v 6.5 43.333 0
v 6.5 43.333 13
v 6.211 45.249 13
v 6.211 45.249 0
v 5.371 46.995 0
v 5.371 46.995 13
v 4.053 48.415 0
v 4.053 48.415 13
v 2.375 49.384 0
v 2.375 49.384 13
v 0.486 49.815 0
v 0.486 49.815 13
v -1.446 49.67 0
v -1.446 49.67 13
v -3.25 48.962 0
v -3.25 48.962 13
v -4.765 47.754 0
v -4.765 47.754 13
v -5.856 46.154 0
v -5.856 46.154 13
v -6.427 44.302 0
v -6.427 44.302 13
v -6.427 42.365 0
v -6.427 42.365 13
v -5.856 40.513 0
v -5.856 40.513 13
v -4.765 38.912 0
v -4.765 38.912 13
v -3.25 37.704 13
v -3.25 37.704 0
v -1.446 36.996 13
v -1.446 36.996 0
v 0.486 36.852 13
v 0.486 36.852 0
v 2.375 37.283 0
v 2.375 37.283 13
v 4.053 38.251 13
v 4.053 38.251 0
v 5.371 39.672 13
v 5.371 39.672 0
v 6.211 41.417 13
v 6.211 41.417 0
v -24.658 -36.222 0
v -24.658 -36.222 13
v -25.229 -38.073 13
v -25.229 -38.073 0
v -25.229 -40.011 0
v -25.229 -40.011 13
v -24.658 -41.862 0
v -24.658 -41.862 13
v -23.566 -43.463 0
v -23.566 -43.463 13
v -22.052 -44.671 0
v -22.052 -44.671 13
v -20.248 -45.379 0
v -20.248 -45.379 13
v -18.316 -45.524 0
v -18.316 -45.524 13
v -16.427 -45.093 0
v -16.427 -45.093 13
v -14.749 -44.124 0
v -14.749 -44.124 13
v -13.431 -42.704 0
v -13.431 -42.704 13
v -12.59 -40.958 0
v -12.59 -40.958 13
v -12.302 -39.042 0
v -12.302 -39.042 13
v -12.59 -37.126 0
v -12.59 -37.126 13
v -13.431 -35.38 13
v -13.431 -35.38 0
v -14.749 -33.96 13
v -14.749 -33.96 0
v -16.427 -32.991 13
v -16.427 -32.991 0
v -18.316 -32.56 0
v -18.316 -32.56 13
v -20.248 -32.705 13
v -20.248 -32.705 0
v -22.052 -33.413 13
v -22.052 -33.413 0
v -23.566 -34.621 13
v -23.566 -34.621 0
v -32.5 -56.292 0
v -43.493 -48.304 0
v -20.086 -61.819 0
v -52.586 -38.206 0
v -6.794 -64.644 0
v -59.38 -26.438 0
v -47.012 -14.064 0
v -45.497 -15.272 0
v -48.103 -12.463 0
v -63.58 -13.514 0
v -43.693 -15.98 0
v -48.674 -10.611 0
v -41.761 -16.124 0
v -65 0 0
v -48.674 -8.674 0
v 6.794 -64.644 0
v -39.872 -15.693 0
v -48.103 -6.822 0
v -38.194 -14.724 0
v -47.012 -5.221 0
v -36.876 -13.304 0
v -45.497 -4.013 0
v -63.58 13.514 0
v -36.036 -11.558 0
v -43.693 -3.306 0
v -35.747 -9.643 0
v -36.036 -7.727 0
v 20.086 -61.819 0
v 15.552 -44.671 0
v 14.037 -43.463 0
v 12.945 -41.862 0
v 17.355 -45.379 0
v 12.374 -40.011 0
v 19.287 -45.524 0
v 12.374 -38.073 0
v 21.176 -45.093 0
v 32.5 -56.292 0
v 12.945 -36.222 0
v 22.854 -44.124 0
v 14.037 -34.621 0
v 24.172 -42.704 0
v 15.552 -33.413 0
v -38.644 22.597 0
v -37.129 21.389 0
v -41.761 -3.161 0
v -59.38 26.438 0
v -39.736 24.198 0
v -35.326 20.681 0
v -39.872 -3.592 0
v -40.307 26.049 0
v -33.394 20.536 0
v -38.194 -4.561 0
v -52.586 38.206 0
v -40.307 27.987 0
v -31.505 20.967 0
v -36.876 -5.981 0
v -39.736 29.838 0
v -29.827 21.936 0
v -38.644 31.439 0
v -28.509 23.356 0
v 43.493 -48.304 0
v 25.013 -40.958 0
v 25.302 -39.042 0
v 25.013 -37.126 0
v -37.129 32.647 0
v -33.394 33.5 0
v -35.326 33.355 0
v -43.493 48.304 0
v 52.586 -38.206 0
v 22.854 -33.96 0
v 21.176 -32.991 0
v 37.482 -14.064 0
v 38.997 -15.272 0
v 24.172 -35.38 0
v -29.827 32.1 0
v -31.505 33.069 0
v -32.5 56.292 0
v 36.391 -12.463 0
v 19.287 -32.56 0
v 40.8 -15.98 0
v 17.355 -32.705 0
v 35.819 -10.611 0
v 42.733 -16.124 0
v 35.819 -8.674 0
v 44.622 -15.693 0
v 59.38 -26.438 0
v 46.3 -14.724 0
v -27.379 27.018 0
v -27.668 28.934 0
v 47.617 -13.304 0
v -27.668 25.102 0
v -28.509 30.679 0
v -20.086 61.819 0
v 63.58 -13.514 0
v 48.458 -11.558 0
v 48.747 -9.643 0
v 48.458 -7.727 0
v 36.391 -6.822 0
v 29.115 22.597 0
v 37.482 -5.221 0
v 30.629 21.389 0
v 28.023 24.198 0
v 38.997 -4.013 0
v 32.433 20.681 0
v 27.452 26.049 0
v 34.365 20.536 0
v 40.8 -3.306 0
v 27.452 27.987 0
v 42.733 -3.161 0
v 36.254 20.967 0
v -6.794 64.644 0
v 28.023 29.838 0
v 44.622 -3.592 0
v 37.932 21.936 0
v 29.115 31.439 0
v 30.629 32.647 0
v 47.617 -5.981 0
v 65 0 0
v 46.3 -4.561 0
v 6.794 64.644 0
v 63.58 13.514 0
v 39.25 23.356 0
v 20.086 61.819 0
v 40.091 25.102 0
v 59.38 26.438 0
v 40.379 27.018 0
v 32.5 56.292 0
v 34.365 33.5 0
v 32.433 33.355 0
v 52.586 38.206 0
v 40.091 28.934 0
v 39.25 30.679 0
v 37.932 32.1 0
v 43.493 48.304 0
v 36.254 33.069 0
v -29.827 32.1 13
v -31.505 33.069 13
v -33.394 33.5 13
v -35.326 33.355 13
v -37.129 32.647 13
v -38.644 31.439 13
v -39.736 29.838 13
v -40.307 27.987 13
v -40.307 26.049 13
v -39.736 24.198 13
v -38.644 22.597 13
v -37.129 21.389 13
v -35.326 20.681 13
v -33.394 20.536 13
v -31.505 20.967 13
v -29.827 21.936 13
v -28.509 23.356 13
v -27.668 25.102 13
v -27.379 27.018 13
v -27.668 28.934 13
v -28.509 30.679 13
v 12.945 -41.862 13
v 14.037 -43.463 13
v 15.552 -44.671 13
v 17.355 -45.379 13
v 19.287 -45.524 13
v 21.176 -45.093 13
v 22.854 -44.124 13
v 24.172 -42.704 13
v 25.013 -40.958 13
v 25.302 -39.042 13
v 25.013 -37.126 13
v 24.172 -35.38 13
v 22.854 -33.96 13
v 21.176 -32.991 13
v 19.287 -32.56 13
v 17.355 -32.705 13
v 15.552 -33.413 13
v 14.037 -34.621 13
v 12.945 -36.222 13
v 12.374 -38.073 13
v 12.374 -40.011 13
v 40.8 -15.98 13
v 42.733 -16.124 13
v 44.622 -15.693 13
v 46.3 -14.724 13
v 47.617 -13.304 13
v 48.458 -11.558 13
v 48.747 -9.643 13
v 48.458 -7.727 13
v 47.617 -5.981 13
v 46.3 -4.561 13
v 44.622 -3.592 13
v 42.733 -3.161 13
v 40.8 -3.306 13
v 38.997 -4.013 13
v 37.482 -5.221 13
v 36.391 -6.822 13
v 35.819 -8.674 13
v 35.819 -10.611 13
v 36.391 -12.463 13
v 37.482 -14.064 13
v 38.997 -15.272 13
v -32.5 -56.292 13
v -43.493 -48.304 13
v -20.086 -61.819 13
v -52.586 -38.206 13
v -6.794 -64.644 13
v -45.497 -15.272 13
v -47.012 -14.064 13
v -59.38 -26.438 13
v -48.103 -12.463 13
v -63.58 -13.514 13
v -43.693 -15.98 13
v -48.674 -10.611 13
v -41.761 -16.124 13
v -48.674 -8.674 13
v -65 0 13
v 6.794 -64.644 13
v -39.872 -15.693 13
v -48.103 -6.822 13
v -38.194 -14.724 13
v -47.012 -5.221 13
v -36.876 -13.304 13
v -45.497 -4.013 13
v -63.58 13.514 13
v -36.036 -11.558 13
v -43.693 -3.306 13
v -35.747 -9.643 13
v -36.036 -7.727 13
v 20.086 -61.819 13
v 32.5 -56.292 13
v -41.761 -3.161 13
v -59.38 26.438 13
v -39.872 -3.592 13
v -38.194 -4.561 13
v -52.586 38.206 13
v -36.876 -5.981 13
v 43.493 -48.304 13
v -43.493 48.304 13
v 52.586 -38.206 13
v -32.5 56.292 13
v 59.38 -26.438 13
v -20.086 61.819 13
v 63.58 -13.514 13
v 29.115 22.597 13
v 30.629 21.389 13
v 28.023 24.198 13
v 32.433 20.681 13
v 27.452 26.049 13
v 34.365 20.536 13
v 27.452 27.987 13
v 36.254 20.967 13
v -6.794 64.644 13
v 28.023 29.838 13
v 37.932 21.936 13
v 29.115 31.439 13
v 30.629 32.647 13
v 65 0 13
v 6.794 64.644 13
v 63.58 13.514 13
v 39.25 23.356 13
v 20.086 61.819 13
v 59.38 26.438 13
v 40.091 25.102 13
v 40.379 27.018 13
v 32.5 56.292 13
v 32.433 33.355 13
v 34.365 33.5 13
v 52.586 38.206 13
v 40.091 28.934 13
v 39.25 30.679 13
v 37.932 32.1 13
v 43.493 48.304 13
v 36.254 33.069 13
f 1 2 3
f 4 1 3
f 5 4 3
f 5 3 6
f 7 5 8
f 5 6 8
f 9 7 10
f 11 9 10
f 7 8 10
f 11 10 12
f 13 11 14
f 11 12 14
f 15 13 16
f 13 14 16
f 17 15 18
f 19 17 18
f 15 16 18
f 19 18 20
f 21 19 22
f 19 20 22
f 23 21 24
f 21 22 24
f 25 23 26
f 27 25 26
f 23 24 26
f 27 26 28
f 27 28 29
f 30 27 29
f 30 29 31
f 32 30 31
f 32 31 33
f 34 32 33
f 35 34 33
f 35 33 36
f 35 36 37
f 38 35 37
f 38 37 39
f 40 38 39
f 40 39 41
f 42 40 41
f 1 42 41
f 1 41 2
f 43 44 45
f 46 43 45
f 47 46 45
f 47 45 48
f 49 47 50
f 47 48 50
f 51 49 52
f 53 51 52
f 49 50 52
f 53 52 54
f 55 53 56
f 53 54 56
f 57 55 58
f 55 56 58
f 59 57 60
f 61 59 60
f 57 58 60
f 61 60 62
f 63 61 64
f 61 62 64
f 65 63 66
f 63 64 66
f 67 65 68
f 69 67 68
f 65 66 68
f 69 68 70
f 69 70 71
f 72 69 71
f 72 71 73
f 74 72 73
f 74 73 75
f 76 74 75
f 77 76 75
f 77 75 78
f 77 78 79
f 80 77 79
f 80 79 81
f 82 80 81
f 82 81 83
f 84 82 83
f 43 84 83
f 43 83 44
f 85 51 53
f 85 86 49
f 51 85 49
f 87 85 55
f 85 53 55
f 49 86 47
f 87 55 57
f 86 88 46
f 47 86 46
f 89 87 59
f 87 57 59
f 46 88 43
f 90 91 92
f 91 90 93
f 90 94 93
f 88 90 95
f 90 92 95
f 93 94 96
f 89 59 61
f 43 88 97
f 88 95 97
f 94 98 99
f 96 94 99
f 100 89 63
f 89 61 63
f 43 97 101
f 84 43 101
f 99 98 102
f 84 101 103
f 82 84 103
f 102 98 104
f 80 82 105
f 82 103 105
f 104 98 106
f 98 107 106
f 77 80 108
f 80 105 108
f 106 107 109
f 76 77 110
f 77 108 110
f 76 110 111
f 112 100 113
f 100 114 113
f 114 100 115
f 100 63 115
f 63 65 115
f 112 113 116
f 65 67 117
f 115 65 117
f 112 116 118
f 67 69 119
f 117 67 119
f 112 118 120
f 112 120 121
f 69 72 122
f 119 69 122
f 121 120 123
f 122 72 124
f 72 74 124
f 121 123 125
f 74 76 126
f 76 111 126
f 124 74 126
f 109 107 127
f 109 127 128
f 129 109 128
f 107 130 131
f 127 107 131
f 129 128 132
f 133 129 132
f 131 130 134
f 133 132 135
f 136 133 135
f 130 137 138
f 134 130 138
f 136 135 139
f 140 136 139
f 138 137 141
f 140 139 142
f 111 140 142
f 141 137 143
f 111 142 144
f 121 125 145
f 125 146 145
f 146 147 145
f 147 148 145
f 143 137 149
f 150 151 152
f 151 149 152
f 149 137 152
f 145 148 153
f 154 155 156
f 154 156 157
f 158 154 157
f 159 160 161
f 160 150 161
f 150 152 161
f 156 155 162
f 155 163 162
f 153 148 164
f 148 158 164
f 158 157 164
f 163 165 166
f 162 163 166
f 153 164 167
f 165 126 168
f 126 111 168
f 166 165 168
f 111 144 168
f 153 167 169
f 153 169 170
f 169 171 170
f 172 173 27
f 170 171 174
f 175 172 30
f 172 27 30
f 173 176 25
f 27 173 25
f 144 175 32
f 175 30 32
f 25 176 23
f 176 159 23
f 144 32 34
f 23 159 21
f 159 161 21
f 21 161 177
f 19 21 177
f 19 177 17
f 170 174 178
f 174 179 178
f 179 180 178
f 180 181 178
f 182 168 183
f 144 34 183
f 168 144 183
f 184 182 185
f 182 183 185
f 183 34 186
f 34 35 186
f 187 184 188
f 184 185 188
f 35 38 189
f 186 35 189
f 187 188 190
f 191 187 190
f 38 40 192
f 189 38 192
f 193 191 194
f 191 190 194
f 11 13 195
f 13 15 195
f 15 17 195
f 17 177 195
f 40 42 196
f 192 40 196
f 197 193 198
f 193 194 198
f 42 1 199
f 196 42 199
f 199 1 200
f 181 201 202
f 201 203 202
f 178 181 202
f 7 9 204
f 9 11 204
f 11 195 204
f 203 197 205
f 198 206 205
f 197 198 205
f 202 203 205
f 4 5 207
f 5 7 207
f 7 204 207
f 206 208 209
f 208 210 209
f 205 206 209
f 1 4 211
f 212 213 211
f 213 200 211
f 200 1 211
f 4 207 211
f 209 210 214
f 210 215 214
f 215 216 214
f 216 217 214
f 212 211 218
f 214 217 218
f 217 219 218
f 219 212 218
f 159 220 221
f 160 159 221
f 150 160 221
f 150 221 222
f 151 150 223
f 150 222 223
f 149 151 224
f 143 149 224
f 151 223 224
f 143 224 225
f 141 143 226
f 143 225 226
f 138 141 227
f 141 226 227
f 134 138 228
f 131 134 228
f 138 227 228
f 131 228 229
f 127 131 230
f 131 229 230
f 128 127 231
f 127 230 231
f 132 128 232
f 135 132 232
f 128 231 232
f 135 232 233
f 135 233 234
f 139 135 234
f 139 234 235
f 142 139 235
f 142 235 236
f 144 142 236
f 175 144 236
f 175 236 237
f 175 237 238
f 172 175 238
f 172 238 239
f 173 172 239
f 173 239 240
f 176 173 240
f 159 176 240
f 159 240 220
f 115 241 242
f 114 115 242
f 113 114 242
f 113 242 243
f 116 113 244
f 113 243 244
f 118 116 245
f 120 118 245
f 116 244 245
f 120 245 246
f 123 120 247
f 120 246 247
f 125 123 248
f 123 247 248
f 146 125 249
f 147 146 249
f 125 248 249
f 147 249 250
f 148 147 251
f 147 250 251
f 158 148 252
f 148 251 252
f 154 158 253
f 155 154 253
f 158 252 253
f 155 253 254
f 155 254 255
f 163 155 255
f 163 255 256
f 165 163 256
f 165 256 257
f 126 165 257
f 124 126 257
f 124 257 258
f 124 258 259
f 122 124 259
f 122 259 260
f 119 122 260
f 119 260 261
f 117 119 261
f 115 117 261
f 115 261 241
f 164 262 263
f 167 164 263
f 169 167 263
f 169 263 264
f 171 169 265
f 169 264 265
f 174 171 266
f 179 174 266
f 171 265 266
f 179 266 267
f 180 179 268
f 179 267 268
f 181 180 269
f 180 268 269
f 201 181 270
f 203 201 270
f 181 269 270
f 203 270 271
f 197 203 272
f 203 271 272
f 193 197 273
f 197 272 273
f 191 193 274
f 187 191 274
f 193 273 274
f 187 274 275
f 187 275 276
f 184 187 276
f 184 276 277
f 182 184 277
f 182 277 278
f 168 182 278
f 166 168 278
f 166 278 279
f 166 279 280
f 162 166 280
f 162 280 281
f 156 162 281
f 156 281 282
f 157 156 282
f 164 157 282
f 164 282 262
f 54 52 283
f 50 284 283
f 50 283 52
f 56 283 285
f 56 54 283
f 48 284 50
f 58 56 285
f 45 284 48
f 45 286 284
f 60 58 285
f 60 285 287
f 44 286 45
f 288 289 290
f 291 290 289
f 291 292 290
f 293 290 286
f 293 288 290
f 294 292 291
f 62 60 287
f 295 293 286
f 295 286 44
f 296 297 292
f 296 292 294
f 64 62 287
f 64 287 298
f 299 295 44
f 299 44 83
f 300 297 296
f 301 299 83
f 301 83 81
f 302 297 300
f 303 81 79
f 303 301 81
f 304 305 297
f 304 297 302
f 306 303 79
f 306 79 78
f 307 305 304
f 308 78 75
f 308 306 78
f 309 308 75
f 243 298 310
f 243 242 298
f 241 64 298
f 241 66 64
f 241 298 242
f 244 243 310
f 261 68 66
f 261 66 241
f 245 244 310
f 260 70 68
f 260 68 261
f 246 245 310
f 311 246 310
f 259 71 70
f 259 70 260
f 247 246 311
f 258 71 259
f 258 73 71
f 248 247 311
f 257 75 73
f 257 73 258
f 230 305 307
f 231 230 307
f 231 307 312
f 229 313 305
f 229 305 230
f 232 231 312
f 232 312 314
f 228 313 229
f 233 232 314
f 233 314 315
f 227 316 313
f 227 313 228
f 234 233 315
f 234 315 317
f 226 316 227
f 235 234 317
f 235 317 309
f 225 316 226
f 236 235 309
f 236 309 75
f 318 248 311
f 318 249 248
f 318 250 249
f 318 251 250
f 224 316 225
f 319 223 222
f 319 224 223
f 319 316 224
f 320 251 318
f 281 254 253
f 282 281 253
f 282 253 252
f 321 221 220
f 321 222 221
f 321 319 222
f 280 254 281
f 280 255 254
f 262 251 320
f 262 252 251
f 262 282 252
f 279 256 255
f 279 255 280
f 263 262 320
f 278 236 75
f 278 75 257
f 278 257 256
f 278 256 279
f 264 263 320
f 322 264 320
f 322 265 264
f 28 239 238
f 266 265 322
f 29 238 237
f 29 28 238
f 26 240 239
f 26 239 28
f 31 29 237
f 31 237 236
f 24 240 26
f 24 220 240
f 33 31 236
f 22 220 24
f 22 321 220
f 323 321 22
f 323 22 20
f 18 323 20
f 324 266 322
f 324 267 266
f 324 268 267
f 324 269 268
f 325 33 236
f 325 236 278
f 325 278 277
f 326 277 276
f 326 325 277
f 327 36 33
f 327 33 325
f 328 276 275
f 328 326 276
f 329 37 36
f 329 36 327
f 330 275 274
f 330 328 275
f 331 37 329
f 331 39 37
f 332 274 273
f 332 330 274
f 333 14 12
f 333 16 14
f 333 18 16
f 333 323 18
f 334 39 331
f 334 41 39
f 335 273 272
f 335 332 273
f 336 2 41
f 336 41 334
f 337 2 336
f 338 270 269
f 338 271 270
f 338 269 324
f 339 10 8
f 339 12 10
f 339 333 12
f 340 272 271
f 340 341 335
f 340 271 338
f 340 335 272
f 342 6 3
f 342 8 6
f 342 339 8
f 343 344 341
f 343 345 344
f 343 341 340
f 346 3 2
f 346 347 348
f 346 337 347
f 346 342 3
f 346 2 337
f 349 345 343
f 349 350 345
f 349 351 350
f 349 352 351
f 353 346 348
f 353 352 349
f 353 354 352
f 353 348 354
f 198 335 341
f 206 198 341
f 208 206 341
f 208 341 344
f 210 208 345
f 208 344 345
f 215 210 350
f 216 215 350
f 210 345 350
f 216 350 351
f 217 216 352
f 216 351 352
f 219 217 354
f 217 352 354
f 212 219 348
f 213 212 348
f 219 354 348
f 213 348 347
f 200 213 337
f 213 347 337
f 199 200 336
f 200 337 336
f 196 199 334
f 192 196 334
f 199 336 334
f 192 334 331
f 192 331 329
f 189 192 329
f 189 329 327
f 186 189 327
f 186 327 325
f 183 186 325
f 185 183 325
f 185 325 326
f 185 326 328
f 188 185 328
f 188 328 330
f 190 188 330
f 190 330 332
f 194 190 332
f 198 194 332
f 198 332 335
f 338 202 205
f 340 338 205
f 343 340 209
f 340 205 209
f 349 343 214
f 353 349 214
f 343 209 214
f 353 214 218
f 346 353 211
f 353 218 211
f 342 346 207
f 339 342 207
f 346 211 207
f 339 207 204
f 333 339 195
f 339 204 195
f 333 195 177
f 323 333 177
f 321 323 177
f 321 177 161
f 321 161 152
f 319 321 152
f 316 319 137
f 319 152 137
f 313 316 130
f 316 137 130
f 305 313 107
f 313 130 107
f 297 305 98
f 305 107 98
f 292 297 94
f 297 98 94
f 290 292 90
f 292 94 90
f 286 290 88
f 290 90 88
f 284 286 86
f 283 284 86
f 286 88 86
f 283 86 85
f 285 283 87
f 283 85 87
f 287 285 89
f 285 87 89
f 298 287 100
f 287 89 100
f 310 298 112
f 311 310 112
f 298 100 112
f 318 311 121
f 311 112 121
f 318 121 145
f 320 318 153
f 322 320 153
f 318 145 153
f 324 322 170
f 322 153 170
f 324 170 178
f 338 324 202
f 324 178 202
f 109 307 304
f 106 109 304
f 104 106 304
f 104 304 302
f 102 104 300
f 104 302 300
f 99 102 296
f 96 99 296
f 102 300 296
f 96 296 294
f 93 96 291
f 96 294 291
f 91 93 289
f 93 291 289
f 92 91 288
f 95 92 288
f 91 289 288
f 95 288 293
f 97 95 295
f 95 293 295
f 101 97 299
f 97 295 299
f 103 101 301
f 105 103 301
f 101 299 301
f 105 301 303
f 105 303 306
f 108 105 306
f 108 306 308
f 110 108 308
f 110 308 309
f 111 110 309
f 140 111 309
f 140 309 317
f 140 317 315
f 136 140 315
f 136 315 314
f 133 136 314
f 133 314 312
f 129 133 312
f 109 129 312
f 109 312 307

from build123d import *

# Parameters (mm, degrees)
F2_R            = 65
F3_DEPTH        = 13
F4_R            = 6.5
F5_DEPTH        = 13.001
F5_COPIES_COUNT = 7


# Not quite as in the source:
# - a pattern or mirror of a feature is missing from the dataset's text; its kind, count and spacing are read off the source's solid


with BuildPart() as f3:
    # F2 (on Top) → F3 (new body)
    with BuildSketch(Plane.XY):
        Circle(F2_R)
    extrude(amount=F3_DEPTH)

    # F4 (on face) → F5 (cut, through all)
    with BuildSketch(Plane.XY.offset(13)):
        with Locations((0, 43.3333333333)):
            Circle(F4_R)
    f5 = extrude(amount=-F5_DEPTH, mode=Mode.SUBTRACT)

    # F5_copies: F5 ×7 about axis
    f5_copies_axis = Axis((0, 0, 0), (0, 0, 1))
    for i in range(1, F5_COPIES_COUNT):
        add(f5.rotate(f5_copies_axis, i * 360 / F5_COPIES_COUNT), mode=Mode.SUBTRACT)


solid = f3.part
